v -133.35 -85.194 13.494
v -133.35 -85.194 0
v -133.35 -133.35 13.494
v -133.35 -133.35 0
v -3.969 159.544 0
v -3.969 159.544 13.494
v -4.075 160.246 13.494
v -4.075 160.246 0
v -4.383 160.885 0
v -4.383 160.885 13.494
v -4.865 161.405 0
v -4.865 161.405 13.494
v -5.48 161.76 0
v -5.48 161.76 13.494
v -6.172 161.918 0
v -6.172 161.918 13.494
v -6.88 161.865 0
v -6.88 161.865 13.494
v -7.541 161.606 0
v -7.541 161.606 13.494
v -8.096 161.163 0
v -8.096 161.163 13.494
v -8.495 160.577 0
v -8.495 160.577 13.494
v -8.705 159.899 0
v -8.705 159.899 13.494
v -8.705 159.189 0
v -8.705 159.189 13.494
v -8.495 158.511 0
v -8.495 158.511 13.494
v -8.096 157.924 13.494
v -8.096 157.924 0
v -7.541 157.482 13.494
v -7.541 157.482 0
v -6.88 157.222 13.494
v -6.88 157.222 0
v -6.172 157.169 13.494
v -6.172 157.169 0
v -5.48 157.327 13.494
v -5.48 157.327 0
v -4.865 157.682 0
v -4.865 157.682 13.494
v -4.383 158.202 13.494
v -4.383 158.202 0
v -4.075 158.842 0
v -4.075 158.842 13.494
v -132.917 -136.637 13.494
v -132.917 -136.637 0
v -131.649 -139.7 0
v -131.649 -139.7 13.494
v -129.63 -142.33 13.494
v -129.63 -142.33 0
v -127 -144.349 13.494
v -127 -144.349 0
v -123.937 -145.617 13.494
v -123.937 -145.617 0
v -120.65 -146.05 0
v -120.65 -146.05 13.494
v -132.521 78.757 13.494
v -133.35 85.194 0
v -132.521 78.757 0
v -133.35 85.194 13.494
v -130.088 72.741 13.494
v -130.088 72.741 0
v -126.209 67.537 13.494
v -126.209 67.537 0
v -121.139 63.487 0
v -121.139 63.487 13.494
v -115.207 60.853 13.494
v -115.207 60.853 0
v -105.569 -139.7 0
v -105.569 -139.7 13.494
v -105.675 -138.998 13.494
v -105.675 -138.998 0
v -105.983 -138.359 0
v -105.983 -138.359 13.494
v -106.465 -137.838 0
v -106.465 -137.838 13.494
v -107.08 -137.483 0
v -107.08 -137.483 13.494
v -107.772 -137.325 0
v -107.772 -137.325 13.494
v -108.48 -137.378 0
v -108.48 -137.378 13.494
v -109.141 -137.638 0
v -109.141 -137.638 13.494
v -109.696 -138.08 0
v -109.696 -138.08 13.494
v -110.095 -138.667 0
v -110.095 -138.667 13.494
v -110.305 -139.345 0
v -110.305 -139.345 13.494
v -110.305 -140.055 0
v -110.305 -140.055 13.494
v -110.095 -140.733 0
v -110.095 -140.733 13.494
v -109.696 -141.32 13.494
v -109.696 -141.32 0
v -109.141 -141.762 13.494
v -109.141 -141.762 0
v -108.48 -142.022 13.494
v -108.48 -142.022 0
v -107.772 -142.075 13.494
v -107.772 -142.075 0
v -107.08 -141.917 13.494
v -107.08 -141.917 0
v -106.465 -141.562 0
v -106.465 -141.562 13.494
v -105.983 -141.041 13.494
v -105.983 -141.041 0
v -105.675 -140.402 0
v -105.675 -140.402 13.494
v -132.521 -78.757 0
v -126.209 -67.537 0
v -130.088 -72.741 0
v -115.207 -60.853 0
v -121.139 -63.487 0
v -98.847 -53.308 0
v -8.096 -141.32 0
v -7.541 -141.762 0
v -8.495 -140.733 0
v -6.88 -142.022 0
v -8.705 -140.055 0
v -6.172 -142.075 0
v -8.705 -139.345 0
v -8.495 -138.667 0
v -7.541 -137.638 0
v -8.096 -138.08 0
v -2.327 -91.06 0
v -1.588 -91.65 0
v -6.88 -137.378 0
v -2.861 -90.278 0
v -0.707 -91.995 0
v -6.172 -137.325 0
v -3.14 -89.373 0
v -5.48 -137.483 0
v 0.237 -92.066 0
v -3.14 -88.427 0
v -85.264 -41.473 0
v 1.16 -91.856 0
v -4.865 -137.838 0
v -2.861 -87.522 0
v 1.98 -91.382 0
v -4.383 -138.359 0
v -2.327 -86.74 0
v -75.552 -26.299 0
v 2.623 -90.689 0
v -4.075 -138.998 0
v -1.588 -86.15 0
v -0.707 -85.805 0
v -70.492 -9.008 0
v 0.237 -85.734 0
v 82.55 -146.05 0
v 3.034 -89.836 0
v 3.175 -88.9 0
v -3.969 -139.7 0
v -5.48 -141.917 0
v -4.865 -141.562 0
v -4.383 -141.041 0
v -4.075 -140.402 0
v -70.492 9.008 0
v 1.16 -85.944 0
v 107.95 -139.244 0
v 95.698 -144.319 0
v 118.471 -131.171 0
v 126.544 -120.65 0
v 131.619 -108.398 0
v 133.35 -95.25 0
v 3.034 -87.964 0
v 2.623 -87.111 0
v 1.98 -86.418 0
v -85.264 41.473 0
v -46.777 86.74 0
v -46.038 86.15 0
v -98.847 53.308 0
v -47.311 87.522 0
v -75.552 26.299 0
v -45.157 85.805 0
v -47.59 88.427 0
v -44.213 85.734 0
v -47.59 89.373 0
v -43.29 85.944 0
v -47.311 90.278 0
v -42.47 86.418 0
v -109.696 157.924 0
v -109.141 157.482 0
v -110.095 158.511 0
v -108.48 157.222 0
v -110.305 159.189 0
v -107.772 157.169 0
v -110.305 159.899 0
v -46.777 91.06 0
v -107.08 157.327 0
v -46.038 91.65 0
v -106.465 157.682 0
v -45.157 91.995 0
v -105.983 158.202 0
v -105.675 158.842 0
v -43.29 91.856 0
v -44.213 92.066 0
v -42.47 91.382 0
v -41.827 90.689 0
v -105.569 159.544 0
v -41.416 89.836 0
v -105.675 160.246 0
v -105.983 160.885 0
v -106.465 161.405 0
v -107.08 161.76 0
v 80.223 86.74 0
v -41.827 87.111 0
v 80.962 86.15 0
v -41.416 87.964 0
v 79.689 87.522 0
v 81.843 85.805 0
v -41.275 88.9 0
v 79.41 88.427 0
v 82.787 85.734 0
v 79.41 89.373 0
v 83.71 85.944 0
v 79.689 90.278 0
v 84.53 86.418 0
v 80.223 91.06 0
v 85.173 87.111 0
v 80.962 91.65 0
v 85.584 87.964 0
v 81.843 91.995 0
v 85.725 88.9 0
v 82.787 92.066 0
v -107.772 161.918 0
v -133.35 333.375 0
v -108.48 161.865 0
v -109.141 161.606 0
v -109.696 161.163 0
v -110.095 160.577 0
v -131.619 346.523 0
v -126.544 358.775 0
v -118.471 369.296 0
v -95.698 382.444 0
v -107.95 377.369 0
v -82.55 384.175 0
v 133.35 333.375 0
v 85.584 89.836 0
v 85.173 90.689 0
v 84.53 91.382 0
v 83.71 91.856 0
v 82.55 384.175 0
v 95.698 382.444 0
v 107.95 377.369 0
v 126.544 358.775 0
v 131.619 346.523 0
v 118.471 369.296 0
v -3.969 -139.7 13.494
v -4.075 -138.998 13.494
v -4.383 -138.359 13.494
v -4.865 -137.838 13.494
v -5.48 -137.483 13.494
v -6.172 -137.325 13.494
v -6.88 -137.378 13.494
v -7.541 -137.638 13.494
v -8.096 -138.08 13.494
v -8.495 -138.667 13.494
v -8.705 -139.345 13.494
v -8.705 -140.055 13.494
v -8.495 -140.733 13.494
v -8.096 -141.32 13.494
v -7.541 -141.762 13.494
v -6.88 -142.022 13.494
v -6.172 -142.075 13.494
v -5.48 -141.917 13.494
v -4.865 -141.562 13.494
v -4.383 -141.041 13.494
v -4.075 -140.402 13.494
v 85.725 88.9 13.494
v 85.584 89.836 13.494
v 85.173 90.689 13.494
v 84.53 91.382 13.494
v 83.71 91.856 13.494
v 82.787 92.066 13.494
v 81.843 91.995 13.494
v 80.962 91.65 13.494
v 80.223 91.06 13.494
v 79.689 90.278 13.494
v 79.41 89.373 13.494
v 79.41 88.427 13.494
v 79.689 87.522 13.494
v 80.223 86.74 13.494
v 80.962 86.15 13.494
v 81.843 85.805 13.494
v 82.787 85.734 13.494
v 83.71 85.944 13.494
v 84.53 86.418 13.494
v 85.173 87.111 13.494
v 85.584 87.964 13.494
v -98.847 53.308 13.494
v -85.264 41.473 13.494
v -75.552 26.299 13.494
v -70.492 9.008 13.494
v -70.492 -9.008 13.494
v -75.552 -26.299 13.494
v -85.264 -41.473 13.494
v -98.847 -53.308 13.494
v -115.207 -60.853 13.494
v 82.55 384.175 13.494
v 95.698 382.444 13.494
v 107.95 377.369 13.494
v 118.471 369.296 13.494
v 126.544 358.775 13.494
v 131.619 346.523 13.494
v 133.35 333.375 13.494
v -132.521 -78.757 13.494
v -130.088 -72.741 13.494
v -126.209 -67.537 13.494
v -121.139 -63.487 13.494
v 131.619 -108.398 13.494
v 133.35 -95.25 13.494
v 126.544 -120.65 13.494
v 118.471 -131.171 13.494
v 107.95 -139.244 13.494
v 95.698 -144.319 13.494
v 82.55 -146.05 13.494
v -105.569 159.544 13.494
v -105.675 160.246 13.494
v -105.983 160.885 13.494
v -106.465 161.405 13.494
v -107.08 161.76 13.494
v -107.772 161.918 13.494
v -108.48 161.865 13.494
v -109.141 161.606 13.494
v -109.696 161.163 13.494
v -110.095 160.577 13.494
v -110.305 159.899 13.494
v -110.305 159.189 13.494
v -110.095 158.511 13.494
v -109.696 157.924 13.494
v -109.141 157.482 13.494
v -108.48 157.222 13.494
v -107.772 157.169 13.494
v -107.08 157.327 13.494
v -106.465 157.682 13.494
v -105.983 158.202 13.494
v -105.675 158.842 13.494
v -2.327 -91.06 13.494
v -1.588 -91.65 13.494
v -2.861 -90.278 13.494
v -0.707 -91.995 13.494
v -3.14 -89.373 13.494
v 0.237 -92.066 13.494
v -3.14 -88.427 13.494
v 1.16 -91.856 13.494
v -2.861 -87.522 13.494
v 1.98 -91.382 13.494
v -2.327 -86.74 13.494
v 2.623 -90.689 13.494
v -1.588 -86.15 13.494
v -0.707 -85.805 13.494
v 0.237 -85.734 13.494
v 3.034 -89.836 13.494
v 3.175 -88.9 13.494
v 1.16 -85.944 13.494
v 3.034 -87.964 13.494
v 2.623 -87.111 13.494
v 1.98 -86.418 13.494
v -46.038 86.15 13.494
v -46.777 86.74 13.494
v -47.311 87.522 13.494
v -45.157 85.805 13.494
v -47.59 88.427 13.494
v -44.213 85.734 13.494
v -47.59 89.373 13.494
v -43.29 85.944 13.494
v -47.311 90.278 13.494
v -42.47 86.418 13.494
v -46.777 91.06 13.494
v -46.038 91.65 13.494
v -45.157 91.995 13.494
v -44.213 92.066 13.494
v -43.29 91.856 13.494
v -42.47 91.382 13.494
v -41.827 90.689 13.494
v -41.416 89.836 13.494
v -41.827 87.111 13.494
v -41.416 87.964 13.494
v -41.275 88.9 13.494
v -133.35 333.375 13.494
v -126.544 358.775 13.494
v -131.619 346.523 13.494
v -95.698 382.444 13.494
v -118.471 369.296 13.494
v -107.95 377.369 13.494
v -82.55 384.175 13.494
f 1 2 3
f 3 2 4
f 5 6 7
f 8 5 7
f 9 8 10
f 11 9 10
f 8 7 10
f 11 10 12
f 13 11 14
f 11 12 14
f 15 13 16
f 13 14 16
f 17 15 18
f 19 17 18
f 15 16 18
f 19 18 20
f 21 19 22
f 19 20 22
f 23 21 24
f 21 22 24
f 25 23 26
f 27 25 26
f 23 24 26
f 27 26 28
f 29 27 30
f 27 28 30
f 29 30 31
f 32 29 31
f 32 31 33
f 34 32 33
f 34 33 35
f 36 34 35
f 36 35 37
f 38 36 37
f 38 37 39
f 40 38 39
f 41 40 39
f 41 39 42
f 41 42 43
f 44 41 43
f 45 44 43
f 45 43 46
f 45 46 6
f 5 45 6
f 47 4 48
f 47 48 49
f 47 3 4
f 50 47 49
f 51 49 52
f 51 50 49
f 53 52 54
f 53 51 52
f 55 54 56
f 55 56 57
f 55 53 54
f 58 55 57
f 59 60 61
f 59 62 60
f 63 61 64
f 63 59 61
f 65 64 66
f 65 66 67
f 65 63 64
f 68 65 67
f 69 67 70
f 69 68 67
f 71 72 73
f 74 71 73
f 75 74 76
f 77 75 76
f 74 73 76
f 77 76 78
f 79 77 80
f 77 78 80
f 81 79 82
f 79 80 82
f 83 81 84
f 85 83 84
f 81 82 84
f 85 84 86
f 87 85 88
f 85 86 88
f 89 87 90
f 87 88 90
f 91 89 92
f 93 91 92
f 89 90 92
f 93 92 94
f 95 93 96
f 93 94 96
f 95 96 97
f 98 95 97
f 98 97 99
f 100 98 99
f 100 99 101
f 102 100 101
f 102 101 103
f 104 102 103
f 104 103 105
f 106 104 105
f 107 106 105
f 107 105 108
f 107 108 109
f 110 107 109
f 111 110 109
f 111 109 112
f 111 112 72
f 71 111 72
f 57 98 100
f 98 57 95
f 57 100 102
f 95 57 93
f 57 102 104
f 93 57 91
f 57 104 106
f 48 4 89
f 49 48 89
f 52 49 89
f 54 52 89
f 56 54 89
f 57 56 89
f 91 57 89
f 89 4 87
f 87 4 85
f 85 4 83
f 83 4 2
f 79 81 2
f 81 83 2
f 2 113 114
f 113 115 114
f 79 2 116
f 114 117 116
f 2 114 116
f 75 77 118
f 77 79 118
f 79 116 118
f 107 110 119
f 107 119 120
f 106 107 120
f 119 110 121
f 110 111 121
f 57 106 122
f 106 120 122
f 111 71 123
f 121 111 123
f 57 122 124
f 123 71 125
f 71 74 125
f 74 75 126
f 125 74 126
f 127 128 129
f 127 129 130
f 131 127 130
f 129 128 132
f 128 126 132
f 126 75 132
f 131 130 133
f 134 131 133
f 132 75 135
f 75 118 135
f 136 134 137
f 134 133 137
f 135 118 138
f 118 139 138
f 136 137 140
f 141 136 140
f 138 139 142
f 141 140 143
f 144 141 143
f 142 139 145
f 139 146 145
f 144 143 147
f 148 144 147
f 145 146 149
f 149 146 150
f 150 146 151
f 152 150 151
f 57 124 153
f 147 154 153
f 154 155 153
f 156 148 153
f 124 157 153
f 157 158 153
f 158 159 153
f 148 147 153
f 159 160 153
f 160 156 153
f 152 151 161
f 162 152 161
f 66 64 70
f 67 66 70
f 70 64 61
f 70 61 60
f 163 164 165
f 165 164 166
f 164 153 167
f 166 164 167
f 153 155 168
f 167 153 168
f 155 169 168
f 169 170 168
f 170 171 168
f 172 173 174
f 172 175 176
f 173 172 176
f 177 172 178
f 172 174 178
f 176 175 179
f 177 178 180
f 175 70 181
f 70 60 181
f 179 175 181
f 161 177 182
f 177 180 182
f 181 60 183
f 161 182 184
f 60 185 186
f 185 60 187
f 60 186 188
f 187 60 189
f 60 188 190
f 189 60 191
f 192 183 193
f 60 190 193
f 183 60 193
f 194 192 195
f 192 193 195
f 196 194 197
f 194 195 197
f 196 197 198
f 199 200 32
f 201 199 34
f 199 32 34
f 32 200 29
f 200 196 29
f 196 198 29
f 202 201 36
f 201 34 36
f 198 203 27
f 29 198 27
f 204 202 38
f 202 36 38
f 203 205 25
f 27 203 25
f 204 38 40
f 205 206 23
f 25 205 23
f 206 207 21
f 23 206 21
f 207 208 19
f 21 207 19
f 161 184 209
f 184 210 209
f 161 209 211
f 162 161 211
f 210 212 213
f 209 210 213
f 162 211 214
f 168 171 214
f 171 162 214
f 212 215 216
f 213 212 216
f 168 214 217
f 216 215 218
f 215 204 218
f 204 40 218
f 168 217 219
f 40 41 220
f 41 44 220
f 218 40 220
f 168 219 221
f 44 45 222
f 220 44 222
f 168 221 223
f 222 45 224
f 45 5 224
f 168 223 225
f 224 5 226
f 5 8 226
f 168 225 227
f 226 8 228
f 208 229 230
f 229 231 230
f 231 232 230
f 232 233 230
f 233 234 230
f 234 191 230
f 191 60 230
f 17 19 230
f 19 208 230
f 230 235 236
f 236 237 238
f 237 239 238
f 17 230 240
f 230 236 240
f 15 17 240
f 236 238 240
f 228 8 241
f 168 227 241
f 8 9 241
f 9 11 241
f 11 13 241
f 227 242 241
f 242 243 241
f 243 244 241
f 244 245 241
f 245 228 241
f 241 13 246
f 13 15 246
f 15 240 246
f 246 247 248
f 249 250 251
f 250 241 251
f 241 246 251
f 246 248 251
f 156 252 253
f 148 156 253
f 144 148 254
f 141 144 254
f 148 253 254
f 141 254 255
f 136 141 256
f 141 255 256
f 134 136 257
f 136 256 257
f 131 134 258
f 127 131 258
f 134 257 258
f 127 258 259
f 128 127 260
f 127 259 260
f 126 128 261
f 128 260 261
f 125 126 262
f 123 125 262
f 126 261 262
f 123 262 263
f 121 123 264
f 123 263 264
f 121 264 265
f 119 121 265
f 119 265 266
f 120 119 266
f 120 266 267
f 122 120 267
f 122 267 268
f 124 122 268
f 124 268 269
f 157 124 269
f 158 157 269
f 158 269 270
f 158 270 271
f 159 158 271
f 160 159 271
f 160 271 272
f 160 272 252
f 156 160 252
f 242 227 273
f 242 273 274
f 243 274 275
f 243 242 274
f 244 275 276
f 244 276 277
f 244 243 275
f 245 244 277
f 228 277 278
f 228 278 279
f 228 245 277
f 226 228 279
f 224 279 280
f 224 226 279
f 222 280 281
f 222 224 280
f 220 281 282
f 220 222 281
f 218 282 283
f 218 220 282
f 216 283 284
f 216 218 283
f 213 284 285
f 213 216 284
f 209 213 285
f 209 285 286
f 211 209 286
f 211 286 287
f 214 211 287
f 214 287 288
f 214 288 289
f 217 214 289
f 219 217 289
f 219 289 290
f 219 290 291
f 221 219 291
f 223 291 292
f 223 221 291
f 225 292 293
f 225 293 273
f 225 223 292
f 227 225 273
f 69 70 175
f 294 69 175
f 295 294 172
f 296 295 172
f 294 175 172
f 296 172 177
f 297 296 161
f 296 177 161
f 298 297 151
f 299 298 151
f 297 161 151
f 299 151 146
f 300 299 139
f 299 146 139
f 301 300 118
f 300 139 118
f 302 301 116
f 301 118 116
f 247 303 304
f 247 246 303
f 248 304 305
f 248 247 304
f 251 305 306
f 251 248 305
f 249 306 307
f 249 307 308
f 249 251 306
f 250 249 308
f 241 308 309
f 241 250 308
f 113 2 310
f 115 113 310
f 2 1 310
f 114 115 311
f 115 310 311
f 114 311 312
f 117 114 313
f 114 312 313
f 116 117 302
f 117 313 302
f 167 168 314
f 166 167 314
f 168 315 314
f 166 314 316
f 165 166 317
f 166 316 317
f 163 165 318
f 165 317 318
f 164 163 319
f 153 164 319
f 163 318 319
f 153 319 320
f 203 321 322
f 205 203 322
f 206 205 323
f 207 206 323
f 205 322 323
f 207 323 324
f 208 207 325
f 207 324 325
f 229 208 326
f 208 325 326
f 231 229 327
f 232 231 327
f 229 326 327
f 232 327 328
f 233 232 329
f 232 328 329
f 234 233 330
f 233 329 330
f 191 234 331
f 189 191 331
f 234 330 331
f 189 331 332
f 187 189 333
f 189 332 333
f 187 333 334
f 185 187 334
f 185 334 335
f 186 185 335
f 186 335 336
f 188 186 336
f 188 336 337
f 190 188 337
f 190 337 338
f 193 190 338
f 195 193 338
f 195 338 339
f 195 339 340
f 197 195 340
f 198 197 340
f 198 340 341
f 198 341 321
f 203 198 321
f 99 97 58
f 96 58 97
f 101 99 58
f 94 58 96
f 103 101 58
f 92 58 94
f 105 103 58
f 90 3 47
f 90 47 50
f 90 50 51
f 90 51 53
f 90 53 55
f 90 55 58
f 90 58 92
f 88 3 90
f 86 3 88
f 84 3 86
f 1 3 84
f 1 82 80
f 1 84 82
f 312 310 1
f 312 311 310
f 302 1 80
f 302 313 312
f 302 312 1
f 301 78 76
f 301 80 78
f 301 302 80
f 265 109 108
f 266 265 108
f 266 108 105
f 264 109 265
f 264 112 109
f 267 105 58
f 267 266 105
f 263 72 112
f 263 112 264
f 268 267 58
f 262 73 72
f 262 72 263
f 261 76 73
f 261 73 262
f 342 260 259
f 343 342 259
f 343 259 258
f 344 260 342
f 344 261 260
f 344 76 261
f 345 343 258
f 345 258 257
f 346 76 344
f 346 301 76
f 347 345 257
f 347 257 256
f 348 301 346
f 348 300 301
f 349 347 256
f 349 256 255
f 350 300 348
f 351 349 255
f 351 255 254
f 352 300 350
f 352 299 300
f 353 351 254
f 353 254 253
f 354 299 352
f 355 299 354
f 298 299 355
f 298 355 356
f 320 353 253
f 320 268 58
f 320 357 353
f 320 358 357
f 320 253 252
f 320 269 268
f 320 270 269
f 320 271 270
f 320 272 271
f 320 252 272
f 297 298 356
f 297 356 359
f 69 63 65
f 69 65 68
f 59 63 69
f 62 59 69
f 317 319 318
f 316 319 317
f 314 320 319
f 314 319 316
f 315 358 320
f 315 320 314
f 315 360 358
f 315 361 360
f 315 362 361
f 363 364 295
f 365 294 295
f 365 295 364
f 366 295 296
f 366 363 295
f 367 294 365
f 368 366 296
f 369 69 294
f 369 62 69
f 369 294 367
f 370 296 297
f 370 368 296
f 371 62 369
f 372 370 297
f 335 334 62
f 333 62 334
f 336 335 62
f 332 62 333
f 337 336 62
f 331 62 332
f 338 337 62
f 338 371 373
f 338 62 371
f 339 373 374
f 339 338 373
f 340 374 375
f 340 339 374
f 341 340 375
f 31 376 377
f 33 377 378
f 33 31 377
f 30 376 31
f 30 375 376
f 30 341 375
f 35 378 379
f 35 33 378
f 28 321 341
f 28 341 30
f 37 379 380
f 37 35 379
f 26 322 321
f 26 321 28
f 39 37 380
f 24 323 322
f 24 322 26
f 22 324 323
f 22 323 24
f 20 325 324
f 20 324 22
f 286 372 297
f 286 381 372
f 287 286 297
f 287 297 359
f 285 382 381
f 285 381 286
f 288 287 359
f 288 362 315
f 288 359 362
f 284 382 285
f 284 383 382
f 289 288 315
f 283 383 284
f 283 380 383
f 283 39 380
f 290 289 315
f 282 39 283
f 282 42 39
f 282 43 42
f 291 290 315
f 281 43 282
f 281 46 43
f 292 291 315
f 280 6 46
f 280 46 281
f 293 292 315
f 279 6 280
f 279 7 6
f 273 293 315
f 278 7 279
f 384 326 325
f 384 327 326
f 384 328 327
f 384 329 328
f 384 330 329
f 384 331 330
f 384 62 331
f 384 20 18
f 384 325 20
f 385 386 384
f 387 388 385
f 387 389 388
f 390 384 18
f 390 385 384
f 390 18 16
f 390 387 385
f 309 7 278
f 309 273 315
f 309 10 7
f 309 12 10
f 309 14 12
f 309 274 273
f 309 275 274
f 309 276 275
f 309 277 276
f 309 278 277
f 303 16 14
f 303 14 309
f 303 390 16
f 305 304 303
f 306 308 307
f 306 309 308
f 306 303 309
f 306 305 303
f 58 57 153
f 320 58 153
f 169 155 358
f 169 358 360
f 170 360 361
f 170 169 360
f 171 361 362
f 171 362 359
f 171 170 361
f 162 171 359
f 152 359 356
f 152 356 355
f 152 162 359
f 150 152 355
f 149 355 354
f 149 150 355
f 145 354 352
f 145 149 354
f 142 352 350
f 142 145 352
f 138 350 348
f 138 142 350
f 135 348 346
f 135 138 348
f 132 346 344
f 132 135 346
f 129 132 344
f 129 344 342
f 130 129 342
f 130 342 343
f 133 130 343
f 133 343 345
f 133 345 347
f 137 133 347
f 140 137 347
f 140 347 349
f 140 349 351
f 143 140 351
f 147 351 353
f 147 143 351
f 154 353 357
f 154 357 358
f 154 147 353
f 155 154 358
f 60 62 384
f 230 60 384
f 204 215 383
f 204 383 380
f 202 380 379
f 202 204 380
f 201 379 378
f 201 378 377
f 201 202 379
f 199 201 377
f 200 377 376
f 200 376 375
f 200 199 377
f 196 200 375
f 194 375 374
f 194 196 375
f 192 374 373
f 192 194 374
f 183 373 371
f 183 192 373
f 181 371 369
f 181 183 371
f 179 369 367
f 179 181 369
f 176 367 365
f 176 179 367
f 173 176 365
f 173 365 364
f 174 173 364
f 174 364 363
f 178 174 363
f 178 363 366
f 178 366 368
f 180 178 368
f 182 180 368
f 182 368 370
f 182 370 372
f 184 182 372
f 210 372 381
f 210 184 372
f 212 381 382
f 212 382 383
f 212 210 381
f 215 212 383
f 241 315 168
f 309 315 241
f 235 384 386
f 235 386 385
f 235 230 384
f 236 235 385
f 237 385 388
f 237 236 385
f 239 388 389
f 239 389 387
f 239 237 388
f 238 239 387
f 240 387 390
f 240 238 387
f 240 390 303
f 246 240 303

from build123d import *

# Parameters (mm, degrees)
F0_R     = 3.175
F1_DEPTH = 13.49375
F2_R     = 25.4
F4_W     = 266.7
F4_H     = 238.125
F5_DEPTH = 13.49375
F3_R     = 2.38125
F6_DEPTH = 13.49475
F7_R     = 50.8
F8_R     = 12.7


with BuildPart() as f1:
    # F0 (on Top) → F1 (new body)
    with BuildSketch(Plane.XY):
        with BuildLine():
            Line((133.35, -146.05), (133.35, 146.05))
            Line((133.35, 146.05), (-133.35, 146.05))
            Line((-133.35, 146.05), (-133.35, 63.5))
            ThreePointArc((-133.35, 63.5), (-69.85, 0), (-133.35, -63.5))
            Line((-133.35, -63.5), (-133.35, -146.05))
            Line((-133.35, -146.05), (133.35, -146.05))
        make_face()
        with Locations((0, -88.9)):
            Circle(F0_R, mode=Mode.SUBTRACT)
        with Locations((-44.45, 88.9)):
            Circle(F0_R, mode=Mode.SUBTRACT)
        with Locations((82.55, 88.9)):
            Circle(F0_R, mode=Mode.SUBTRACT)
    extrude(amount=F1_DEPTH)

    # F2
    f2_edges = [f1.edges().sort_by_distance(p)[0] for p in [
        (-133.35, -63.5, 6.746875),
        (-133.35, 63.5, 6.746875),
    ]]
    fillet(f2_edges, radius=F2_R)

    # F4 (on face) → F5 (join, through all)
    with BuildSketch(Plane.XY.offset(13.49375)):
        with Locations((0, 265.1125)):
            Rectangle(F4_W, F4_H)
    extrude(amount=-F5_DEPTH)

    # F3 (on face) → F6 (cut, through all)
    with BuildSketch(Plane.XY.offset(13.49375)):
        with Locations((-107.95, -139.7)):
            Circle(F3_R)
        with Locations((-6.35, -139.7)):
            Circle(F3_R)
        with Locations((-6.35, 159.54375)):
            Circle(F3_R)
        with Locations((-107.95, 159.54375)):
            Circle(F3_R)
    extrude(amount=-F6_DEPTH, mode=Mode.SUBTRACT)

    # F7
    f7_edges = [f1.edges().sort_by_distance(p)[0] for p in [
        (133.35, -146.05, 6.746875),
        (133.35, 384.175, 6.746875),
        (-133.35, 384.175, 6.746875),
    ]]
    fillet(f7_edges, radius=F7_R)

    # F8
    f8_edges = [f1.edges().sort_by_distance(p)[0] for p in [
        (-133.35, -146.05, 6.746875),
    ]]
    fillet(f8_edges, radius=F8_R)


solid = f1.part
